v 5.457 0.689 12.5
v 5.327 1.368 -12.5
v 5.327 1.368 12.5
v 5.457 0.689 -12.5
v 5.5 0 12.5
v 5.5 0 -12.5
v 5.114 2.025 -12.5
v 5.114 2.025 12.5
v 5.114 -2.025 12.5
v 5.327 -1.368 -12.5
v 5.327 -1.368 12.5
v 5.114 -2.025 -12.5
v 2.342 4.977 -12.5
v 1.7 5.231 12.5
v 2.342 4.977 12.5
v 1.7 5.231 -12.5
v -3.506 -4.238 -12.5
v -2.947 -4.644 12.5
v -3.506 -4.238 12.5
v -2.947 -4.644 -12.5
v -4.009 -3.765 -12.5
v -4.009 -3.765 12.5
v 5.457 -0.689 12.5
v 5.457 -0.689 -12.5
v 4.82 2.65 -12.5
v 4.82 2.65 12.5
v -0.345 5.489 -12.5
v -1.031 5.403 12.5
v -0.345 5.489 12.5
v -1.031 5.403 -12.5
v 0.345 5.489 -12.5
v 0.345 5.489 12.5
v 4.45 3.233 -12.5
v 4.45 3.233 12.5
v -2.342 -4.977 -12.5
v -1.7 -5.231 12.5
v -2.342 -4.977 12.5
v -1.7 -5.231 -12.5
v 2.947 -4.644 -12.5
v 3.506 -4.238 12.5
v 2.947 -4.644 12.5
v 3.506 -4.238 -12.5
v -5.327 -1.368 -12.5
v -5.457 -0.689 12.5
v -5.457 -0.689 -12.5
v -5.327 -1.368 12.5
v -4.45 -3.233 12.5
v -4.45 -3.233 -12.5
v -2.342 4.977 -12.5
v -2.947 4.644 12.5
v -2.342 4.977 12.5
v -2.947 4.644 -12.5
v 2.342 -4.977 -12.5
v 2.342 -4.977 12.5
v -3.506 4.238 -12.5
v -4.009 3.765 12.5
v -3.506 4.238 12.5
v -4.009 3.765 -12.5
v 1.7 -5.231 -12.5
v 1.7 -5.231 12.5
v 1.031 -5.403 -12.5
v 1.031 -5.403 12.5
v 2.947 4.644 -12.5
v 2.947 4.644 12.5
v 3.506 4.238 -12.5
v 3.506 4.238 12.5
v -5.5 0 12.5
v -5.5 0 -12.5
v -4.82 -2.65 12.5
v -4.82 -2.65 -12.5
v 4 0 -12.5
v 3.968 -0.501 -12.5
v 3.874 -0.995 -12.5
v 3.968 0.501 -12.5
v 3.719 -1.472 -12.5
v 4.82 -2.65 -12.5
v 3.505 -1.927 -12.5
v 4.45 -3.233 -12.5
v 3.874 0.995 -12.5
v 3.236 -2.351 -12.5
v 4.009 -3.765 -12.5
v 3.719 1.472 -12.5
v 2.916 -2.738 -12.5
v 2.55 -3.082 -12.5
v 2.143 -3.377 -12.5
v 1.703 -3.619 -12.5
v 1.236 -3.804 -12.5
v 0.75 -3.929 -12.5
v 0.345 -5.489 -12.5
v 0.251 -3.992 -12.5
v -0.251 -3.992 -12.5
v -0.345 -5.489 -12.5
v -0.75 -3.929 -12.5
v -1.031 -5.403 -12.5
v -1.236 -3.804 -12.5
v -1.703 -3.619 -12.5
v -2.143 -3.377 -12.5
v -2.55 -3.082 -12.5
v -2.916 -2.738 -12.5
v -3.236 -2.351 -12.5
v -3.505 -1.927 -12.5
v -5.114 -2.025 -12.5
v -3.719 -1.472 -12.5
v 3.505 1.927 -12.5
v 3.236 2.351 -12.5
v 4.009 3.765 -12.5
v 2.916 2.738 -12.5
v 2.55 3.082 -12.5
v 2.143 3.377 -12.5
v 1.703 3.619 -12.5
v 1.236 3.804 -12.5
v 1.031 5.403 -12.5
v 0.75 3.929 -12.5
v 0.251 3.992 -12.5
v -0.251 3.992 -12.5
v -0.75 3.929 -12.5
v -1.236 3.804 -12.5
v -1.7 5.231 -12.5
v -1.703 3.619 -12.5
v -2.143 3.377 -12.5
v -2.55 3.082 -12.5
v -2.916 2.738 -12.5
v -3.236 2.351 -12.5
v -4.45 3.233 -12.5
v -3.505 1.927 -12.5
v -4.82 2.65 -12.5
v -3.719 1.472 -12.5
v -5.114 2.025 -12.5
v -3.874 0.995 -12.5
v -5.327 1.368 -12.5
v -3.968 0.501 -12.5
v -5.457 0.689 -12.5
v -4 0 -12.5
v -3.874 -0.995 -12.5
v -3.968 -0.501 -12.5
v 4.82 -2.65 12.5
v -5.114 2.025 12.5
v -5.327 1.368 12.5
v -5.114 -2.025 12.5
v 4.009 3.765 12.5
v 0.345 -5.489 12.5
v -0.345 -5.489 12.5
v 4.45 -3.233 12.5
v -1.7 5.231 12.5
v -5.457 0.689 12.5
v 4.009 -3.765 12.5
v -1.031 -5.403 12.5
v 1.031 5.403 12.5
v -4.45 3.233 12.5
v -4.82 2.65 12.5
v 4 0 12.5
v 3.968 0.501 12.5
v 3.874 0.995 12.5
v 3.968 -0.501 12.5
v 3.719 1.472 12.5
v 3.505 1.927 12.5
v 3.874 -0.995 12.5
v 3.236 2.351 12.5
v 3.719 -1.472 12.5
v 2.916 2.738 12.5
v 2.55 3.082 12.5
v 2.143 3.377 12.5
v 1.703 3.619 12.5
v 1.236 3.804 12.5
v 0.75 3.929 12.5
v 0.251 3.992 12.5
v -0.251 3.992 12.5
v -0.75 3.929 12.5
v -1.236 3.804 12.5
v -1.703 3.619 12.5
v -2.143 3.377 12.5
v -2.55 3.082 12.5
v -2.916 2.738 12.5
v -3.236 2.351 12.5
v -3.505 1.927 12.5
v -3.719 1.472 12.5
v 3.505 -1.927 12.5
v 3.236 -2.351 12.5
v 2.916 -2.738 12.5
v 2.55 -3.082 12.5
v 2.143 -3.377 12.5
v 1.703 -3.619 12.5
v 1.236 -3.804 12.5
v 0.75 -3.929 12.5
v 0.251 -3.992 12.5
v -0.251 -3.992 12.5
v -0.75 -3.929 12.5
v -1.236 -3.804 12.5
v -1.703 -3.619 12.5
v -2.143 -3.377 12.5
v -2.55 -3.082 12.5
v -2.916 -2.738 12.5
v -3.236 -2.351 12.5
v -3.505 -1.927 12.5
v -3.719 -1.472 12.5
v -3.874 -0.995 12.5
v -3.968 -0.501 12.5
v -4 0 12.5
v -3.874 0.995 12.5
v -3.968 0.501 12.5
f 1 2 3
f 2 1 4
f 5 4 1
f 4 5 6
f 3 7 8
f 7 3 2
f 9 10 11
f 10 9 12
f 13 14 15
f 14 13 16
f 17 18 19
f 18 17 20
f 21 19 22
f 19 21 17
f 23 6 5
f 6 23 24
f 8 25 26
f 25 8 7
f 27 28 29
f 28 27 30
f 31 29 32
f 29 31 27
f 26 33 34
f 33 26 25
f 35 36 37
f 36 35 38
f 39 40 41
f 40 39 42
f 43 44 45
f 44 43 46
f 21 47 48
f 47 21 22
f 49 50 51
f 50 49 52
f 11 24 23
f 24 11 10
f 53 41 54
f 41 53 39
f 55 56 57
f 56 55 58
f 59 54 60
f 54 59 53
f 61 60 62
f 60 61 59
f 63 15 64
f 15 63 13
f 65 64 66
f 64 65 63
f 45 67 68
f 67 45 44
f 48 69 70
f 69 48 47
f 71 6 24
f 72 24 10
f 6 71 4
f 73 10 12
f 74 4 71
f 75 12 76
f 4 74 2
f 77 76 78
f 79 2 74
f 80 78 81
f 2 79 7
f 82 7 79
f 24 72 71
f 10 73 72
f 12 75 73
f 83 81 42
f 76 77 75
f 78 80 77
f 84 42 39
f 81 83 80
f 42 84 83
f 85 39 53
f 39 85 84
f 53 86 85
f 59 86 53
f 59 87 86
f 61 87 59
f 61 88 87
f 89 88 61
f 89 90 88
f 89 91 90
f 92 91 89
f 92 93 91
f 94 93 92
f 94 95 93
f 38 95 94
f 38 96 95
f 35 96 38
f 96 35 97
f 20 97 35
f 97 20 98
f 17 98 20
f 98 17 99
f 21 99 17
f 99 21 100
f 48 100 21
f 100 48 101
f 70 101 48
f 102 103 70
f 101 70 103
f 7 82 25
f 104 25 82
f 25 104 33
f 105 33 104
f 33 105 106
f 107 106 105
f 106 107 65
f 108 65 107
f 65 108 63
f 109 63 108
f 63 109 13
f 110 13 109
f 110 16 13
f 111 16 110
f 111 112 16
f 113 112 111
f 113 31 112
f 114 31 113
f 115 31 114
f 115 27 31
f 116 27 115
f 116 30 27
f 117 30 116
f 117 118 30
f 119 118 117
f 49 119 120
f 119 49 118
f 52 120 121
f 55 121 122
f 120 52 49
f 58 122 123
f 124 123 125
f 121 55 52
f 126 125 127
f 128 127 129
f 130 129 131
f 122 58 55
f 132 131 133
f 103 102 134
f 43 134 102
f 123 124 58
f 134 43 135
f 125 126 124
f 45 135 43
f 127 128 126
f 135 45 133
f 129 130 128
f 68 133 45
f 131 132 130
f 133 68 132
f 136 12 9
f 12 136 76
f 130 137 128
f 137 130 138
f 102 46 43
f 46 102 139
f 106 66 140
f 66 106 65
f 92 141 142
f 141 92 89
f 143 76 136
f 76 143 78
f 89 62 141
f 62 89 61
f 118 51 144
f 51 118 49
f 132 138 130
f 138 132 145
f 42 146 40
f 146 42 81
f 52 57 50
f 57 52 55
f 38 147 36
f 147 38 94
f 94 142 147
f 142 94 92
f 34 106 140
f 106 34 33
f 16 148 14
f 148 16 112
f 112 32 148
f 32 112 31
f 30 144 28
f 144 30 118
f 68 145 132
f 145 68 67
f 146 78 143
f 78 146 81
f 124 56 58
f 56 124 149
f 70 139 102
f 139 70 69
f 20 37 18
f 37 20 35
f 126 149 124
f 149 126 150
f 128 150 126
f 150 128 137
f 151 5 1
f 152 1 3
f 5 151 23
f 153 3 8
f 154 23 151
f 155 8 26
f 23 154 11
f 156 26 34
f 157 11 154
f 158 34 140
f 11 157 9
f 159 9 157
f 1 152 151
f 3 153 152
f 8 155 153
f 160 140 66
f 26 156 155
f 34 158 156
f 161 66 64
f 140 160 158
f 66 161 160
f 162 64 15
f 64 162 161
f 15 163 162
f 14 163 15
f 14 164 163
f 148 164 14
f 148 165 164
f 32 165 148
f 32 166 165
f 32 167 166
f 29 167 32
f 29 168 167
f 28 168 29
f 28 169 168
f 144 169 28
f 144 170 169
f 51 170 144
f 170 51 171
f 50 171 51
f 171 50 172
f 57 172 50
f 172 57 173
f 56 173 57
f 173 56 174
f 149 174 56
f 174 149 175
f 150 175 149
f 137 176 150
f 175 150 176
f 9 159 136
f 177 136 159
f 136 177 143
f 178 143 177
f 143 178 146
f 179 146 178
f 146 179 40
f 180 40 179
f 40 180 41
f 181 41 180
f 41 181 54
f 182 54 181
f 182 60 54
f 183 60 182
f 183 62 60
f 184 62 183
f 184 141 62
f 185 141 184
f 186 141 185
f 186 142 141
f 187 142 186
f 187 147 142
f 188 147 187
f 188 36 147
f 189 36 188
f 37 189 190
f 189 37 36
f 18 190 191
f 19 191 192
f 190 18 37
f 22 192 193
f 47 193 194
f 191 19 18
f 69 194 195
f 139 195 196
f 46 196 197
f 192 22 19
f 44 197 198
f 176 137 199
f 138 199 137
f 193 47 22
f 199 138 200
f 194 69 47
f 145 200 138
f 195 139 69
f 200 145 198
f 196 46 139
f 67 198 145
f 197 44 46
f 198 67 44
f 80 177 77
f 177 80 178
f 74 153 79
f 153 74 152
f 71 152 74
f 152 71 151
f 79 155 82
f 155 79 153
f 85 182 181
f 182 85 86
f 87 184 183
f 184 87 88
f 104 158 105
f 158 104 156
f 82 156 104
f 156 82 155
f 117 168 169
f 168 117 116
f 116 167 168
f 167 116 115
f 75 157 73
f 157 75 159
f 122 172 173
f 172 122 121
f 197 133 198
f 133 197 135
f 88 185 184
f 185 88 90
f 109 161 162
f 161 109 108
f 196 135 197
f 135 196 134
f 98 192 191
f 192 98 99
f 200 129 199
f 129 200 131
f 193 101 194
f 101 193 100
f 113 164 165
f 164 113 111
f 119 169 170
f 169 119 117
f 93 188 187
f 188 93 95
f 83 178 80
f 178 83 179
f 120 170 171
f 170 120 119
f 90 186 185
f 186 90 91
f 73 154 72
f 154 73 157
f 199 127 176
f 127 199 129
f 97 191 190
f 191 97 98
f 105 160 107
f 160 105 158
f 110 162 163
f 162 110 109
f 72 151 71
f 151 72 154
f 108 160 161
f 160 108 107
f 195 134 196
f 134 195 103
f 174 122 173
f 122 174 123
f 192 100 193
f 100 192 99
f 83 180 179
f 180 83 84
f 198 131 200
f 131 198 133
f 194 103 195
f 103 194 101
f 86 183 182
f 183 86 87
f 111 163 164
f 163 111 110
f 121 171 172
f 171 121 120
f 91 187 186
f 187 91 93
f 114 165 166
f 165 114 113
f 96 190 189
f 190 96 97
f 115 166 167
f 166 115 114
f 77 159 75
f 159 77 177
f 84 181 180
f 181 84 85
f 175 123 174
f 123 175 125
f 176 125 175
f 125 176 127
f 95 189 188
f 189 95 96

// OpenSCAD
$fn = 50;


difference() {
	union() {
		translate(v = [0, 0, -12.5000000000]) {
			cylinder(h = 25, r = 5.5000000000);
		}
	}
	union() {
		translate(v = [0, 0, -100.0000000000]) {
			cylinder(h = 200, r = 4.0000000000);
		}
	}
}
